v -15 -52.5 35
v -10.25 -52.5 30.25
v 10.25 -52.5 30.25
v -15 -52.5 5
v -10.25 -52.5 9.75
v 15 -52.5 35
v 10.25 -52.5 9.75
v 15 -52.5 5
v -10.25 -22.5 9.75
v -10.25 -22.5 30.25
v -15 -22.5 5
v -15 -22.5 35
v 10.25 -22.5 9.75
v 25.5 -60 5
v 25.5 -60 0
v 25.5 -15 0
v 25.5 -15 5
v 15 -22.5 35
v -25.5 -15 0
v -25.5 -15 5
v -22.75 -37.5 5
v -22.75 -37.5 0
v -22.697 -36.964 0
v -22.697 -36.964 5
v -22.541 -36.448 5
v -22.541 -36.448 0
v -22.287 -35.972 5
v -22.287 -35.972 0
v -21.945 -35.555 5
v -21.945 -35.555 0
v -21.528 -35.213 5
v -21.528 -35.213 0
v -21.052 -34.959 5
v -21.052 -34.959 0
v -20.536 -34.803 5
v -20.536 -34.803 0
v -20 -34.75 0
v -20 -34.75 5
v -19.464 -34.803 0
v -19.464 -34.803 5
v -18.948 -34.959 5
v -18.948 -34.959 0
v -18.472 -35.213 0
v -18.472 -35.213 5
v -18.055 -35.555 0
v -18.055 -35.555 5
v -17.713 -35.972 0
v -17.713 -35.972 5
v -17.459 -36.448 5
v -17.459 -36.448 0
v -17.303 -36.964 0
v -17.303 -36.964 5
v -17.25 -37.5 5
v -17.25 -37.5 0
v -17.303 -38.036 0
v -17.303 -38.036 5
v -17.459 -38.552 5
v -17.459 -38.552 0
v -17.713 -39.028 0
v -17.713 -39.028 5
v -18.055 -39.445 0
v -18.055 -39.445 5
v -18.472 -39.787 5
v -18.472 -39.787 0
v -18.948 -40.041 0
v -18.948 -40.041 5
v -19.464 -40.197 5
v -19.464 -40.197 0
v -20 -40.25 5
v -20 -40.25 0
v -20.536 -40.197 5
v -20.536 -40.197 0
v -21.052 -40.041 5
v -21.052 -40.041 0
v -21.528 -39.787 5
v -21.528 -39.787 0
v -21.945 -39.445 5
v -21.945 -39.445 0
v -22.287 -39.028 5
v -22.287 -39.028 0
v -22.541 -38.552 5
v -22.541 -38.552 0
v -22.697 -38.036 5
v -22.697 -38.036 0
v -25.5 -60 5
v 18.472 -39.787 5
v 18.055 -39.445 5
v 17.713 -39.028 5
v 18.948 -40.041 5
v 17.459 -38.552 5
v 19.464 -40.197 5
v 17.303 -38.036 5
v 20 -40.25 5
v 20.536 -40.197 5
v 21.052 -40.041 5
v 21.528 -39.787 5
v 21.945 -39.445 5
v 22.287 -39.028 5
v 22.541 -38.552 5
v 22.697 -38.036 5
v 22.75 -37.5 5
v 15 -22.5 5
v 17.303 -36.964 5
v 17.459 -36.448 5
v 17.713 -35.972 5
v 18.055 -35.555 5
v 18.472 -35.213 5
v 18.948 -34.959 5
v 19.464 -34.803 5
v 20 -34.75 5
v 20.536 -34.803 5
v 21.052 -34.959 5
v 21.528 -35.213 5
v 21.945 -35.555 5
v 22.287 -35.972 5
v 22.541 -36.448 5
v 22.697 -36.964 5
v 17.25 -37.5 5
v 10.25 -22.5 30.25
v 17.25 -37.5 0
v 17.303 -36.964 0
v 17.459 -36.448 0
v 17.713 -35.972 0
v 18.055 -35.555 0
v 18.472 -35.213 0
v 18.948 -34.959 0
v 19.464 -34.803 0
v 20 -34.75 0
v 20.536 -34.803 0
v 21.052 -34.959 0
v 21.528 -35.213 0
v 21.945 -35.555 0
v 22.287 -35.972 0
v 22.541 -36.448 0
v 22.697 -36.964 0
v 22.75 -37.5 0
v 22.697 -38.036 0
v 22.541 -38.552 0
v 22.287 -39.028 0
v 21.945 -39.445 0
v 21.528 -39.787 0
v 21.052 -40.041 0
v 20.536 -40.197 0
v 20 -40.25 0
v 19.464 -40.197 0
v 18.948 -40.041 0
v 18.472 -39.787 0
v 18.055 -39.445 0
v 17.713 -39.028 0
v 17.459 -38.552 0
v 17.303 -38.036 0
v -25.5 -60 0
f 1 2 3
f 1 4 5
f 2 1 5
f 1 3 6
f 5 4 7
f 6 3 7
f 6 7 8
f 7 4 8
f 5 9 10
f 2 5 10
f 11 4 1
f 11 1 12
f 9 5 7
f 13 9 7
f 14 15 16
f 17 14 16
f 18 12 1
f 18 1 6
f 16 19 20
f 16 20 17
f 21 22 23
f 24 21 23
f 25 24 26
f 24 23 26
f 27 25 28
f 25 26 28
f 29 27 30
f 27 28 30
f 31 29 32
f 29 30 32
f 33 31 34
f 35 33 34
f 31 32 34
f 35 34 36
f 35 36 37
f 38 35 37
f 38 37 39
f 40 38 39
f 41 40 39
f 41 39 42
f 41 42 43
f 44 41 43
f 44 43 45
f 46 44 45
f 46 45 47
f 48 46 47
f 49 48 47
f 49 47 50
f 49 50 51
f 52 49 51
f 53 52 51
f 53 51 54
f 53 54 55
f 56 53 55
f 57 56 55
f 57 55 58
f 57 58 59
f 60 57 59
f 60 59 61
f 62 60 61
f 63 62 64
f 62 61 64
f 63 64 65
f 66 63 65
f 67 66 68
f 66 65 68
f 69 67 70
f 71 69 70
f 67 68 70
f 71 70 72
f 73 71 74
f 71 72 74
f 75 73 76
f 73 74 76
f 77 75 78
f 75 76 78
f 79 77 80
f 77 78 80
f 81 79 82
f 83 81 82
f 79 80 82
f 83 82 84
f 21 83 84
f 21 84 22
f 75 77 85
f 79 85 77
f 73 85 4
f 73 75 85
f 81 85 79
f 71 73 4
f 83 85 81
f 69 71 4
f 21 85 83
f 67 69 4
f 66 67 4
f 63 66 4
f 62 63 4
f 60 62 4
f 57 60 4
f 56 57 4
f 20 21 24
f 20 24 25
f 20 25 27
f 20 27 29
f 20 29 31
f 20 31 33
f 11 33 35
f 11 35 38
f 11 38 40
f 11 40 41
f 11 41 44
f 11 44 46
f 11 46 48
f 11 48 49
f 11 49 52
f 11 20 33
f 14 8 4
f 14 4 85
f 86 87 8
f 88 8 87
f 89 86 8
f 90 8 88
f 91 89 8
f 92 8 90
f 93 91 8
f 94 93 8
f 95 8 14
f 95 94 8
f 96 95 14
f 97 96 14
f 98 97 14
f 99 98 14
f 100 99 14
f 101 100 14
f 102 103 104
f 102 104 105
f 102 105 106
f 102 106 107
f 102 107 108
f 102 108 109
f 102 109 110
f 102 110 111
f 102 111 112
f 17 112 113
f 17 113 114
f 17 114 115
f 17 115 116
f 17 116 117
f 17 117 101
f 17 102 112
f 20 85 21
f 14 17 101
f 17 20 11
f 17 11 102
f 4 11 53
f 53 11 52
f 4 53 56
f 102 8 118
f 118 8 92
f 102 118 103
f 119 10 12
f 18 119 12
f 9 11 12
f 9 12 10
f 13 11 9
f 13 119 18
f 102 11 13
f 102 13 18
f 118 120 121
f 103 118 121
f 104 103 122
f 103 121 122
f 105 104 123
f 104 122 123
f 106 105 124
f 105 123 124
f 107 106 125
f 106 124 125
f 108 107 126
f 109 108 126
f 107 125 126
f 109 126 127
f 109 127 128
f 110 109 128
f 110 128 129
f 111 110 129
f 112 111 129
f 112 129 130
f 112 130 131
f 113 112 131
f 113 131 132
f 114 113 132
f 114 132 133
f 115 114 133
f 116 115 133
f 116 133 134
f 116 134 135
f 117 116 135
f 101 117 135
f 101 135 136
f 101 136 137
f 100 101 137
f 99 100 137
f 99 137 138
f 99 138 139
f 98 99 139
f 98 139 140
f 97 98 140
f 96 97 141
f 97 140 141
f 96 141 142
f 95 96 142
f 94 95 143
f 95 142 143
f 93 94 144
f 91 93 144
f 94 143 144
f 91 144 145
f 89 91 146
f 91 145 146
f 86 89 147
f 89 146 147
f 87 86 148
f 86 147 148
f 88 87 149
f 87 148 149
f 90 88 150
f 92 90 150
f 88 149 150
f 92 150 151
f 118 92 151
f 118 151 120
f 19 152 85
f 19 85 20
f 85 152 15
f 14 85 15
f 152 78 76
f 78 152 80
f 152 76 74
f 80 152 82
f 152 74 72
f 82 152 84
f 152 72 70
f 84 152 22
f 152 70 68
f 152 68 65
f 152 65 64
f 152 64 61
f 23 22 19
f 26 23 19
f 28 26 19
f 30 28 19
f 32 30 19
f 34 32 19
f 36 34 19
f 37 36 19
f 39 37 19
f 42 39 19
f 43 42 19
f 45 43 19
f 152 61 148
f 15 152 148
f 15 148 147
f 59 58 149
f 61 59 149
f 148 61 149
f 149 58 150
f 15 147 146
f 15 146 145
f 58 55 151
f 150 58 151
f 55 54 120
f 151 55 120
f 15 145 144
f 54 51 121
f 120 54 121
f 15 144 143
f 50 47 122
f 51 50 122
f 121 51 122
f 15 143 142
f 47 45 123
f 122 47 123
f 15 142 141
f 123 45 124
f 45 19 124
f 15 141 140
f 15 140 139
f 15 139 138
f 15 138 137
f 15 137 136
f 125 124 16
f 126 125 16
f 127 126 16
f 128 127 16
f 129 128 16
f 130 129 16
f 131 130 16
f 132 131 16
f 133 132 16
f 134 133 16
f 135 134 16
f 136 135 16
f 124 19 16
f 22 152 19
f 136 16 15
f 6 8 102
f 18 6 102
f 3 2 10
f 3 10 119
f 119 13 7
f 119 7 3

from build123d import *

# Parameters (mm, degrees)
SKETCH1_W           = 51
SKETCH1_H           = 45
BOSS_EXTRUDE1_DEPTH = 5
SKETCH2_W           = 30
SKETCH2_H           = 30
BOSS_EXTRUDE2_DEPTH = 30
SKETCH3_W           = 20.5
SKETCH3_H           = 20.5
CUT_EXTRUDE1_DEPTH  = 38.5
SKETCH4_R           = 2.75
CUT_EXTRUDE2_DEPTH  = 36


with BuildPart() as part:
    # Sketch1 → Boss-Extrude1 (new body)
    with BuildSketch(Plane.XY):
        with Locations((0, -37.5)):
            Rectangle(SKETCH1_W, SKETCH1_H)
    extrude(amount=BOSS_EXTRUDE1_DEPTH)

    # Sketch2 → Boss-Extrude2 (add)
    with BuildSketch(Plane.XY.offset(5)):
        with Locations((0, -37.5)):
            Rectangle(SKETCH2_W, SKETCH2_H)
    extrude(amount=BOSS_EXTRUDE2_DEPTH)

    # Sketch3 → Cut-Extrude1 (cut, through all)
    with BuildSketch(Plane.XZ.offset(52.5)):
        with Locations((0, 20)):
            Rectangle(SKETCH3_W, SKETCH3_H)
    extrude(amount=-CUT_EXTRUDE1_DEPTH, mode=Mode.SUBTRACT)

    # Sketch4 → Cut-Extrude2 (cut, through all)
    with BuildSketch(Plane(origin=(0, 0, 0), x_dir=(-1, 0, 0), z_dir=(0, 0, -1))):
        with Locations((20, -37.5)):
            Circle(SKETCH4_R)
        with Locations((-20, -37.5)):
            Circle(SKETCH4_R)
    extrude(amount=-CUT_EXTRUDE2_DEPTH, mode=Mode.SUBTRACT)


solid = part.part
